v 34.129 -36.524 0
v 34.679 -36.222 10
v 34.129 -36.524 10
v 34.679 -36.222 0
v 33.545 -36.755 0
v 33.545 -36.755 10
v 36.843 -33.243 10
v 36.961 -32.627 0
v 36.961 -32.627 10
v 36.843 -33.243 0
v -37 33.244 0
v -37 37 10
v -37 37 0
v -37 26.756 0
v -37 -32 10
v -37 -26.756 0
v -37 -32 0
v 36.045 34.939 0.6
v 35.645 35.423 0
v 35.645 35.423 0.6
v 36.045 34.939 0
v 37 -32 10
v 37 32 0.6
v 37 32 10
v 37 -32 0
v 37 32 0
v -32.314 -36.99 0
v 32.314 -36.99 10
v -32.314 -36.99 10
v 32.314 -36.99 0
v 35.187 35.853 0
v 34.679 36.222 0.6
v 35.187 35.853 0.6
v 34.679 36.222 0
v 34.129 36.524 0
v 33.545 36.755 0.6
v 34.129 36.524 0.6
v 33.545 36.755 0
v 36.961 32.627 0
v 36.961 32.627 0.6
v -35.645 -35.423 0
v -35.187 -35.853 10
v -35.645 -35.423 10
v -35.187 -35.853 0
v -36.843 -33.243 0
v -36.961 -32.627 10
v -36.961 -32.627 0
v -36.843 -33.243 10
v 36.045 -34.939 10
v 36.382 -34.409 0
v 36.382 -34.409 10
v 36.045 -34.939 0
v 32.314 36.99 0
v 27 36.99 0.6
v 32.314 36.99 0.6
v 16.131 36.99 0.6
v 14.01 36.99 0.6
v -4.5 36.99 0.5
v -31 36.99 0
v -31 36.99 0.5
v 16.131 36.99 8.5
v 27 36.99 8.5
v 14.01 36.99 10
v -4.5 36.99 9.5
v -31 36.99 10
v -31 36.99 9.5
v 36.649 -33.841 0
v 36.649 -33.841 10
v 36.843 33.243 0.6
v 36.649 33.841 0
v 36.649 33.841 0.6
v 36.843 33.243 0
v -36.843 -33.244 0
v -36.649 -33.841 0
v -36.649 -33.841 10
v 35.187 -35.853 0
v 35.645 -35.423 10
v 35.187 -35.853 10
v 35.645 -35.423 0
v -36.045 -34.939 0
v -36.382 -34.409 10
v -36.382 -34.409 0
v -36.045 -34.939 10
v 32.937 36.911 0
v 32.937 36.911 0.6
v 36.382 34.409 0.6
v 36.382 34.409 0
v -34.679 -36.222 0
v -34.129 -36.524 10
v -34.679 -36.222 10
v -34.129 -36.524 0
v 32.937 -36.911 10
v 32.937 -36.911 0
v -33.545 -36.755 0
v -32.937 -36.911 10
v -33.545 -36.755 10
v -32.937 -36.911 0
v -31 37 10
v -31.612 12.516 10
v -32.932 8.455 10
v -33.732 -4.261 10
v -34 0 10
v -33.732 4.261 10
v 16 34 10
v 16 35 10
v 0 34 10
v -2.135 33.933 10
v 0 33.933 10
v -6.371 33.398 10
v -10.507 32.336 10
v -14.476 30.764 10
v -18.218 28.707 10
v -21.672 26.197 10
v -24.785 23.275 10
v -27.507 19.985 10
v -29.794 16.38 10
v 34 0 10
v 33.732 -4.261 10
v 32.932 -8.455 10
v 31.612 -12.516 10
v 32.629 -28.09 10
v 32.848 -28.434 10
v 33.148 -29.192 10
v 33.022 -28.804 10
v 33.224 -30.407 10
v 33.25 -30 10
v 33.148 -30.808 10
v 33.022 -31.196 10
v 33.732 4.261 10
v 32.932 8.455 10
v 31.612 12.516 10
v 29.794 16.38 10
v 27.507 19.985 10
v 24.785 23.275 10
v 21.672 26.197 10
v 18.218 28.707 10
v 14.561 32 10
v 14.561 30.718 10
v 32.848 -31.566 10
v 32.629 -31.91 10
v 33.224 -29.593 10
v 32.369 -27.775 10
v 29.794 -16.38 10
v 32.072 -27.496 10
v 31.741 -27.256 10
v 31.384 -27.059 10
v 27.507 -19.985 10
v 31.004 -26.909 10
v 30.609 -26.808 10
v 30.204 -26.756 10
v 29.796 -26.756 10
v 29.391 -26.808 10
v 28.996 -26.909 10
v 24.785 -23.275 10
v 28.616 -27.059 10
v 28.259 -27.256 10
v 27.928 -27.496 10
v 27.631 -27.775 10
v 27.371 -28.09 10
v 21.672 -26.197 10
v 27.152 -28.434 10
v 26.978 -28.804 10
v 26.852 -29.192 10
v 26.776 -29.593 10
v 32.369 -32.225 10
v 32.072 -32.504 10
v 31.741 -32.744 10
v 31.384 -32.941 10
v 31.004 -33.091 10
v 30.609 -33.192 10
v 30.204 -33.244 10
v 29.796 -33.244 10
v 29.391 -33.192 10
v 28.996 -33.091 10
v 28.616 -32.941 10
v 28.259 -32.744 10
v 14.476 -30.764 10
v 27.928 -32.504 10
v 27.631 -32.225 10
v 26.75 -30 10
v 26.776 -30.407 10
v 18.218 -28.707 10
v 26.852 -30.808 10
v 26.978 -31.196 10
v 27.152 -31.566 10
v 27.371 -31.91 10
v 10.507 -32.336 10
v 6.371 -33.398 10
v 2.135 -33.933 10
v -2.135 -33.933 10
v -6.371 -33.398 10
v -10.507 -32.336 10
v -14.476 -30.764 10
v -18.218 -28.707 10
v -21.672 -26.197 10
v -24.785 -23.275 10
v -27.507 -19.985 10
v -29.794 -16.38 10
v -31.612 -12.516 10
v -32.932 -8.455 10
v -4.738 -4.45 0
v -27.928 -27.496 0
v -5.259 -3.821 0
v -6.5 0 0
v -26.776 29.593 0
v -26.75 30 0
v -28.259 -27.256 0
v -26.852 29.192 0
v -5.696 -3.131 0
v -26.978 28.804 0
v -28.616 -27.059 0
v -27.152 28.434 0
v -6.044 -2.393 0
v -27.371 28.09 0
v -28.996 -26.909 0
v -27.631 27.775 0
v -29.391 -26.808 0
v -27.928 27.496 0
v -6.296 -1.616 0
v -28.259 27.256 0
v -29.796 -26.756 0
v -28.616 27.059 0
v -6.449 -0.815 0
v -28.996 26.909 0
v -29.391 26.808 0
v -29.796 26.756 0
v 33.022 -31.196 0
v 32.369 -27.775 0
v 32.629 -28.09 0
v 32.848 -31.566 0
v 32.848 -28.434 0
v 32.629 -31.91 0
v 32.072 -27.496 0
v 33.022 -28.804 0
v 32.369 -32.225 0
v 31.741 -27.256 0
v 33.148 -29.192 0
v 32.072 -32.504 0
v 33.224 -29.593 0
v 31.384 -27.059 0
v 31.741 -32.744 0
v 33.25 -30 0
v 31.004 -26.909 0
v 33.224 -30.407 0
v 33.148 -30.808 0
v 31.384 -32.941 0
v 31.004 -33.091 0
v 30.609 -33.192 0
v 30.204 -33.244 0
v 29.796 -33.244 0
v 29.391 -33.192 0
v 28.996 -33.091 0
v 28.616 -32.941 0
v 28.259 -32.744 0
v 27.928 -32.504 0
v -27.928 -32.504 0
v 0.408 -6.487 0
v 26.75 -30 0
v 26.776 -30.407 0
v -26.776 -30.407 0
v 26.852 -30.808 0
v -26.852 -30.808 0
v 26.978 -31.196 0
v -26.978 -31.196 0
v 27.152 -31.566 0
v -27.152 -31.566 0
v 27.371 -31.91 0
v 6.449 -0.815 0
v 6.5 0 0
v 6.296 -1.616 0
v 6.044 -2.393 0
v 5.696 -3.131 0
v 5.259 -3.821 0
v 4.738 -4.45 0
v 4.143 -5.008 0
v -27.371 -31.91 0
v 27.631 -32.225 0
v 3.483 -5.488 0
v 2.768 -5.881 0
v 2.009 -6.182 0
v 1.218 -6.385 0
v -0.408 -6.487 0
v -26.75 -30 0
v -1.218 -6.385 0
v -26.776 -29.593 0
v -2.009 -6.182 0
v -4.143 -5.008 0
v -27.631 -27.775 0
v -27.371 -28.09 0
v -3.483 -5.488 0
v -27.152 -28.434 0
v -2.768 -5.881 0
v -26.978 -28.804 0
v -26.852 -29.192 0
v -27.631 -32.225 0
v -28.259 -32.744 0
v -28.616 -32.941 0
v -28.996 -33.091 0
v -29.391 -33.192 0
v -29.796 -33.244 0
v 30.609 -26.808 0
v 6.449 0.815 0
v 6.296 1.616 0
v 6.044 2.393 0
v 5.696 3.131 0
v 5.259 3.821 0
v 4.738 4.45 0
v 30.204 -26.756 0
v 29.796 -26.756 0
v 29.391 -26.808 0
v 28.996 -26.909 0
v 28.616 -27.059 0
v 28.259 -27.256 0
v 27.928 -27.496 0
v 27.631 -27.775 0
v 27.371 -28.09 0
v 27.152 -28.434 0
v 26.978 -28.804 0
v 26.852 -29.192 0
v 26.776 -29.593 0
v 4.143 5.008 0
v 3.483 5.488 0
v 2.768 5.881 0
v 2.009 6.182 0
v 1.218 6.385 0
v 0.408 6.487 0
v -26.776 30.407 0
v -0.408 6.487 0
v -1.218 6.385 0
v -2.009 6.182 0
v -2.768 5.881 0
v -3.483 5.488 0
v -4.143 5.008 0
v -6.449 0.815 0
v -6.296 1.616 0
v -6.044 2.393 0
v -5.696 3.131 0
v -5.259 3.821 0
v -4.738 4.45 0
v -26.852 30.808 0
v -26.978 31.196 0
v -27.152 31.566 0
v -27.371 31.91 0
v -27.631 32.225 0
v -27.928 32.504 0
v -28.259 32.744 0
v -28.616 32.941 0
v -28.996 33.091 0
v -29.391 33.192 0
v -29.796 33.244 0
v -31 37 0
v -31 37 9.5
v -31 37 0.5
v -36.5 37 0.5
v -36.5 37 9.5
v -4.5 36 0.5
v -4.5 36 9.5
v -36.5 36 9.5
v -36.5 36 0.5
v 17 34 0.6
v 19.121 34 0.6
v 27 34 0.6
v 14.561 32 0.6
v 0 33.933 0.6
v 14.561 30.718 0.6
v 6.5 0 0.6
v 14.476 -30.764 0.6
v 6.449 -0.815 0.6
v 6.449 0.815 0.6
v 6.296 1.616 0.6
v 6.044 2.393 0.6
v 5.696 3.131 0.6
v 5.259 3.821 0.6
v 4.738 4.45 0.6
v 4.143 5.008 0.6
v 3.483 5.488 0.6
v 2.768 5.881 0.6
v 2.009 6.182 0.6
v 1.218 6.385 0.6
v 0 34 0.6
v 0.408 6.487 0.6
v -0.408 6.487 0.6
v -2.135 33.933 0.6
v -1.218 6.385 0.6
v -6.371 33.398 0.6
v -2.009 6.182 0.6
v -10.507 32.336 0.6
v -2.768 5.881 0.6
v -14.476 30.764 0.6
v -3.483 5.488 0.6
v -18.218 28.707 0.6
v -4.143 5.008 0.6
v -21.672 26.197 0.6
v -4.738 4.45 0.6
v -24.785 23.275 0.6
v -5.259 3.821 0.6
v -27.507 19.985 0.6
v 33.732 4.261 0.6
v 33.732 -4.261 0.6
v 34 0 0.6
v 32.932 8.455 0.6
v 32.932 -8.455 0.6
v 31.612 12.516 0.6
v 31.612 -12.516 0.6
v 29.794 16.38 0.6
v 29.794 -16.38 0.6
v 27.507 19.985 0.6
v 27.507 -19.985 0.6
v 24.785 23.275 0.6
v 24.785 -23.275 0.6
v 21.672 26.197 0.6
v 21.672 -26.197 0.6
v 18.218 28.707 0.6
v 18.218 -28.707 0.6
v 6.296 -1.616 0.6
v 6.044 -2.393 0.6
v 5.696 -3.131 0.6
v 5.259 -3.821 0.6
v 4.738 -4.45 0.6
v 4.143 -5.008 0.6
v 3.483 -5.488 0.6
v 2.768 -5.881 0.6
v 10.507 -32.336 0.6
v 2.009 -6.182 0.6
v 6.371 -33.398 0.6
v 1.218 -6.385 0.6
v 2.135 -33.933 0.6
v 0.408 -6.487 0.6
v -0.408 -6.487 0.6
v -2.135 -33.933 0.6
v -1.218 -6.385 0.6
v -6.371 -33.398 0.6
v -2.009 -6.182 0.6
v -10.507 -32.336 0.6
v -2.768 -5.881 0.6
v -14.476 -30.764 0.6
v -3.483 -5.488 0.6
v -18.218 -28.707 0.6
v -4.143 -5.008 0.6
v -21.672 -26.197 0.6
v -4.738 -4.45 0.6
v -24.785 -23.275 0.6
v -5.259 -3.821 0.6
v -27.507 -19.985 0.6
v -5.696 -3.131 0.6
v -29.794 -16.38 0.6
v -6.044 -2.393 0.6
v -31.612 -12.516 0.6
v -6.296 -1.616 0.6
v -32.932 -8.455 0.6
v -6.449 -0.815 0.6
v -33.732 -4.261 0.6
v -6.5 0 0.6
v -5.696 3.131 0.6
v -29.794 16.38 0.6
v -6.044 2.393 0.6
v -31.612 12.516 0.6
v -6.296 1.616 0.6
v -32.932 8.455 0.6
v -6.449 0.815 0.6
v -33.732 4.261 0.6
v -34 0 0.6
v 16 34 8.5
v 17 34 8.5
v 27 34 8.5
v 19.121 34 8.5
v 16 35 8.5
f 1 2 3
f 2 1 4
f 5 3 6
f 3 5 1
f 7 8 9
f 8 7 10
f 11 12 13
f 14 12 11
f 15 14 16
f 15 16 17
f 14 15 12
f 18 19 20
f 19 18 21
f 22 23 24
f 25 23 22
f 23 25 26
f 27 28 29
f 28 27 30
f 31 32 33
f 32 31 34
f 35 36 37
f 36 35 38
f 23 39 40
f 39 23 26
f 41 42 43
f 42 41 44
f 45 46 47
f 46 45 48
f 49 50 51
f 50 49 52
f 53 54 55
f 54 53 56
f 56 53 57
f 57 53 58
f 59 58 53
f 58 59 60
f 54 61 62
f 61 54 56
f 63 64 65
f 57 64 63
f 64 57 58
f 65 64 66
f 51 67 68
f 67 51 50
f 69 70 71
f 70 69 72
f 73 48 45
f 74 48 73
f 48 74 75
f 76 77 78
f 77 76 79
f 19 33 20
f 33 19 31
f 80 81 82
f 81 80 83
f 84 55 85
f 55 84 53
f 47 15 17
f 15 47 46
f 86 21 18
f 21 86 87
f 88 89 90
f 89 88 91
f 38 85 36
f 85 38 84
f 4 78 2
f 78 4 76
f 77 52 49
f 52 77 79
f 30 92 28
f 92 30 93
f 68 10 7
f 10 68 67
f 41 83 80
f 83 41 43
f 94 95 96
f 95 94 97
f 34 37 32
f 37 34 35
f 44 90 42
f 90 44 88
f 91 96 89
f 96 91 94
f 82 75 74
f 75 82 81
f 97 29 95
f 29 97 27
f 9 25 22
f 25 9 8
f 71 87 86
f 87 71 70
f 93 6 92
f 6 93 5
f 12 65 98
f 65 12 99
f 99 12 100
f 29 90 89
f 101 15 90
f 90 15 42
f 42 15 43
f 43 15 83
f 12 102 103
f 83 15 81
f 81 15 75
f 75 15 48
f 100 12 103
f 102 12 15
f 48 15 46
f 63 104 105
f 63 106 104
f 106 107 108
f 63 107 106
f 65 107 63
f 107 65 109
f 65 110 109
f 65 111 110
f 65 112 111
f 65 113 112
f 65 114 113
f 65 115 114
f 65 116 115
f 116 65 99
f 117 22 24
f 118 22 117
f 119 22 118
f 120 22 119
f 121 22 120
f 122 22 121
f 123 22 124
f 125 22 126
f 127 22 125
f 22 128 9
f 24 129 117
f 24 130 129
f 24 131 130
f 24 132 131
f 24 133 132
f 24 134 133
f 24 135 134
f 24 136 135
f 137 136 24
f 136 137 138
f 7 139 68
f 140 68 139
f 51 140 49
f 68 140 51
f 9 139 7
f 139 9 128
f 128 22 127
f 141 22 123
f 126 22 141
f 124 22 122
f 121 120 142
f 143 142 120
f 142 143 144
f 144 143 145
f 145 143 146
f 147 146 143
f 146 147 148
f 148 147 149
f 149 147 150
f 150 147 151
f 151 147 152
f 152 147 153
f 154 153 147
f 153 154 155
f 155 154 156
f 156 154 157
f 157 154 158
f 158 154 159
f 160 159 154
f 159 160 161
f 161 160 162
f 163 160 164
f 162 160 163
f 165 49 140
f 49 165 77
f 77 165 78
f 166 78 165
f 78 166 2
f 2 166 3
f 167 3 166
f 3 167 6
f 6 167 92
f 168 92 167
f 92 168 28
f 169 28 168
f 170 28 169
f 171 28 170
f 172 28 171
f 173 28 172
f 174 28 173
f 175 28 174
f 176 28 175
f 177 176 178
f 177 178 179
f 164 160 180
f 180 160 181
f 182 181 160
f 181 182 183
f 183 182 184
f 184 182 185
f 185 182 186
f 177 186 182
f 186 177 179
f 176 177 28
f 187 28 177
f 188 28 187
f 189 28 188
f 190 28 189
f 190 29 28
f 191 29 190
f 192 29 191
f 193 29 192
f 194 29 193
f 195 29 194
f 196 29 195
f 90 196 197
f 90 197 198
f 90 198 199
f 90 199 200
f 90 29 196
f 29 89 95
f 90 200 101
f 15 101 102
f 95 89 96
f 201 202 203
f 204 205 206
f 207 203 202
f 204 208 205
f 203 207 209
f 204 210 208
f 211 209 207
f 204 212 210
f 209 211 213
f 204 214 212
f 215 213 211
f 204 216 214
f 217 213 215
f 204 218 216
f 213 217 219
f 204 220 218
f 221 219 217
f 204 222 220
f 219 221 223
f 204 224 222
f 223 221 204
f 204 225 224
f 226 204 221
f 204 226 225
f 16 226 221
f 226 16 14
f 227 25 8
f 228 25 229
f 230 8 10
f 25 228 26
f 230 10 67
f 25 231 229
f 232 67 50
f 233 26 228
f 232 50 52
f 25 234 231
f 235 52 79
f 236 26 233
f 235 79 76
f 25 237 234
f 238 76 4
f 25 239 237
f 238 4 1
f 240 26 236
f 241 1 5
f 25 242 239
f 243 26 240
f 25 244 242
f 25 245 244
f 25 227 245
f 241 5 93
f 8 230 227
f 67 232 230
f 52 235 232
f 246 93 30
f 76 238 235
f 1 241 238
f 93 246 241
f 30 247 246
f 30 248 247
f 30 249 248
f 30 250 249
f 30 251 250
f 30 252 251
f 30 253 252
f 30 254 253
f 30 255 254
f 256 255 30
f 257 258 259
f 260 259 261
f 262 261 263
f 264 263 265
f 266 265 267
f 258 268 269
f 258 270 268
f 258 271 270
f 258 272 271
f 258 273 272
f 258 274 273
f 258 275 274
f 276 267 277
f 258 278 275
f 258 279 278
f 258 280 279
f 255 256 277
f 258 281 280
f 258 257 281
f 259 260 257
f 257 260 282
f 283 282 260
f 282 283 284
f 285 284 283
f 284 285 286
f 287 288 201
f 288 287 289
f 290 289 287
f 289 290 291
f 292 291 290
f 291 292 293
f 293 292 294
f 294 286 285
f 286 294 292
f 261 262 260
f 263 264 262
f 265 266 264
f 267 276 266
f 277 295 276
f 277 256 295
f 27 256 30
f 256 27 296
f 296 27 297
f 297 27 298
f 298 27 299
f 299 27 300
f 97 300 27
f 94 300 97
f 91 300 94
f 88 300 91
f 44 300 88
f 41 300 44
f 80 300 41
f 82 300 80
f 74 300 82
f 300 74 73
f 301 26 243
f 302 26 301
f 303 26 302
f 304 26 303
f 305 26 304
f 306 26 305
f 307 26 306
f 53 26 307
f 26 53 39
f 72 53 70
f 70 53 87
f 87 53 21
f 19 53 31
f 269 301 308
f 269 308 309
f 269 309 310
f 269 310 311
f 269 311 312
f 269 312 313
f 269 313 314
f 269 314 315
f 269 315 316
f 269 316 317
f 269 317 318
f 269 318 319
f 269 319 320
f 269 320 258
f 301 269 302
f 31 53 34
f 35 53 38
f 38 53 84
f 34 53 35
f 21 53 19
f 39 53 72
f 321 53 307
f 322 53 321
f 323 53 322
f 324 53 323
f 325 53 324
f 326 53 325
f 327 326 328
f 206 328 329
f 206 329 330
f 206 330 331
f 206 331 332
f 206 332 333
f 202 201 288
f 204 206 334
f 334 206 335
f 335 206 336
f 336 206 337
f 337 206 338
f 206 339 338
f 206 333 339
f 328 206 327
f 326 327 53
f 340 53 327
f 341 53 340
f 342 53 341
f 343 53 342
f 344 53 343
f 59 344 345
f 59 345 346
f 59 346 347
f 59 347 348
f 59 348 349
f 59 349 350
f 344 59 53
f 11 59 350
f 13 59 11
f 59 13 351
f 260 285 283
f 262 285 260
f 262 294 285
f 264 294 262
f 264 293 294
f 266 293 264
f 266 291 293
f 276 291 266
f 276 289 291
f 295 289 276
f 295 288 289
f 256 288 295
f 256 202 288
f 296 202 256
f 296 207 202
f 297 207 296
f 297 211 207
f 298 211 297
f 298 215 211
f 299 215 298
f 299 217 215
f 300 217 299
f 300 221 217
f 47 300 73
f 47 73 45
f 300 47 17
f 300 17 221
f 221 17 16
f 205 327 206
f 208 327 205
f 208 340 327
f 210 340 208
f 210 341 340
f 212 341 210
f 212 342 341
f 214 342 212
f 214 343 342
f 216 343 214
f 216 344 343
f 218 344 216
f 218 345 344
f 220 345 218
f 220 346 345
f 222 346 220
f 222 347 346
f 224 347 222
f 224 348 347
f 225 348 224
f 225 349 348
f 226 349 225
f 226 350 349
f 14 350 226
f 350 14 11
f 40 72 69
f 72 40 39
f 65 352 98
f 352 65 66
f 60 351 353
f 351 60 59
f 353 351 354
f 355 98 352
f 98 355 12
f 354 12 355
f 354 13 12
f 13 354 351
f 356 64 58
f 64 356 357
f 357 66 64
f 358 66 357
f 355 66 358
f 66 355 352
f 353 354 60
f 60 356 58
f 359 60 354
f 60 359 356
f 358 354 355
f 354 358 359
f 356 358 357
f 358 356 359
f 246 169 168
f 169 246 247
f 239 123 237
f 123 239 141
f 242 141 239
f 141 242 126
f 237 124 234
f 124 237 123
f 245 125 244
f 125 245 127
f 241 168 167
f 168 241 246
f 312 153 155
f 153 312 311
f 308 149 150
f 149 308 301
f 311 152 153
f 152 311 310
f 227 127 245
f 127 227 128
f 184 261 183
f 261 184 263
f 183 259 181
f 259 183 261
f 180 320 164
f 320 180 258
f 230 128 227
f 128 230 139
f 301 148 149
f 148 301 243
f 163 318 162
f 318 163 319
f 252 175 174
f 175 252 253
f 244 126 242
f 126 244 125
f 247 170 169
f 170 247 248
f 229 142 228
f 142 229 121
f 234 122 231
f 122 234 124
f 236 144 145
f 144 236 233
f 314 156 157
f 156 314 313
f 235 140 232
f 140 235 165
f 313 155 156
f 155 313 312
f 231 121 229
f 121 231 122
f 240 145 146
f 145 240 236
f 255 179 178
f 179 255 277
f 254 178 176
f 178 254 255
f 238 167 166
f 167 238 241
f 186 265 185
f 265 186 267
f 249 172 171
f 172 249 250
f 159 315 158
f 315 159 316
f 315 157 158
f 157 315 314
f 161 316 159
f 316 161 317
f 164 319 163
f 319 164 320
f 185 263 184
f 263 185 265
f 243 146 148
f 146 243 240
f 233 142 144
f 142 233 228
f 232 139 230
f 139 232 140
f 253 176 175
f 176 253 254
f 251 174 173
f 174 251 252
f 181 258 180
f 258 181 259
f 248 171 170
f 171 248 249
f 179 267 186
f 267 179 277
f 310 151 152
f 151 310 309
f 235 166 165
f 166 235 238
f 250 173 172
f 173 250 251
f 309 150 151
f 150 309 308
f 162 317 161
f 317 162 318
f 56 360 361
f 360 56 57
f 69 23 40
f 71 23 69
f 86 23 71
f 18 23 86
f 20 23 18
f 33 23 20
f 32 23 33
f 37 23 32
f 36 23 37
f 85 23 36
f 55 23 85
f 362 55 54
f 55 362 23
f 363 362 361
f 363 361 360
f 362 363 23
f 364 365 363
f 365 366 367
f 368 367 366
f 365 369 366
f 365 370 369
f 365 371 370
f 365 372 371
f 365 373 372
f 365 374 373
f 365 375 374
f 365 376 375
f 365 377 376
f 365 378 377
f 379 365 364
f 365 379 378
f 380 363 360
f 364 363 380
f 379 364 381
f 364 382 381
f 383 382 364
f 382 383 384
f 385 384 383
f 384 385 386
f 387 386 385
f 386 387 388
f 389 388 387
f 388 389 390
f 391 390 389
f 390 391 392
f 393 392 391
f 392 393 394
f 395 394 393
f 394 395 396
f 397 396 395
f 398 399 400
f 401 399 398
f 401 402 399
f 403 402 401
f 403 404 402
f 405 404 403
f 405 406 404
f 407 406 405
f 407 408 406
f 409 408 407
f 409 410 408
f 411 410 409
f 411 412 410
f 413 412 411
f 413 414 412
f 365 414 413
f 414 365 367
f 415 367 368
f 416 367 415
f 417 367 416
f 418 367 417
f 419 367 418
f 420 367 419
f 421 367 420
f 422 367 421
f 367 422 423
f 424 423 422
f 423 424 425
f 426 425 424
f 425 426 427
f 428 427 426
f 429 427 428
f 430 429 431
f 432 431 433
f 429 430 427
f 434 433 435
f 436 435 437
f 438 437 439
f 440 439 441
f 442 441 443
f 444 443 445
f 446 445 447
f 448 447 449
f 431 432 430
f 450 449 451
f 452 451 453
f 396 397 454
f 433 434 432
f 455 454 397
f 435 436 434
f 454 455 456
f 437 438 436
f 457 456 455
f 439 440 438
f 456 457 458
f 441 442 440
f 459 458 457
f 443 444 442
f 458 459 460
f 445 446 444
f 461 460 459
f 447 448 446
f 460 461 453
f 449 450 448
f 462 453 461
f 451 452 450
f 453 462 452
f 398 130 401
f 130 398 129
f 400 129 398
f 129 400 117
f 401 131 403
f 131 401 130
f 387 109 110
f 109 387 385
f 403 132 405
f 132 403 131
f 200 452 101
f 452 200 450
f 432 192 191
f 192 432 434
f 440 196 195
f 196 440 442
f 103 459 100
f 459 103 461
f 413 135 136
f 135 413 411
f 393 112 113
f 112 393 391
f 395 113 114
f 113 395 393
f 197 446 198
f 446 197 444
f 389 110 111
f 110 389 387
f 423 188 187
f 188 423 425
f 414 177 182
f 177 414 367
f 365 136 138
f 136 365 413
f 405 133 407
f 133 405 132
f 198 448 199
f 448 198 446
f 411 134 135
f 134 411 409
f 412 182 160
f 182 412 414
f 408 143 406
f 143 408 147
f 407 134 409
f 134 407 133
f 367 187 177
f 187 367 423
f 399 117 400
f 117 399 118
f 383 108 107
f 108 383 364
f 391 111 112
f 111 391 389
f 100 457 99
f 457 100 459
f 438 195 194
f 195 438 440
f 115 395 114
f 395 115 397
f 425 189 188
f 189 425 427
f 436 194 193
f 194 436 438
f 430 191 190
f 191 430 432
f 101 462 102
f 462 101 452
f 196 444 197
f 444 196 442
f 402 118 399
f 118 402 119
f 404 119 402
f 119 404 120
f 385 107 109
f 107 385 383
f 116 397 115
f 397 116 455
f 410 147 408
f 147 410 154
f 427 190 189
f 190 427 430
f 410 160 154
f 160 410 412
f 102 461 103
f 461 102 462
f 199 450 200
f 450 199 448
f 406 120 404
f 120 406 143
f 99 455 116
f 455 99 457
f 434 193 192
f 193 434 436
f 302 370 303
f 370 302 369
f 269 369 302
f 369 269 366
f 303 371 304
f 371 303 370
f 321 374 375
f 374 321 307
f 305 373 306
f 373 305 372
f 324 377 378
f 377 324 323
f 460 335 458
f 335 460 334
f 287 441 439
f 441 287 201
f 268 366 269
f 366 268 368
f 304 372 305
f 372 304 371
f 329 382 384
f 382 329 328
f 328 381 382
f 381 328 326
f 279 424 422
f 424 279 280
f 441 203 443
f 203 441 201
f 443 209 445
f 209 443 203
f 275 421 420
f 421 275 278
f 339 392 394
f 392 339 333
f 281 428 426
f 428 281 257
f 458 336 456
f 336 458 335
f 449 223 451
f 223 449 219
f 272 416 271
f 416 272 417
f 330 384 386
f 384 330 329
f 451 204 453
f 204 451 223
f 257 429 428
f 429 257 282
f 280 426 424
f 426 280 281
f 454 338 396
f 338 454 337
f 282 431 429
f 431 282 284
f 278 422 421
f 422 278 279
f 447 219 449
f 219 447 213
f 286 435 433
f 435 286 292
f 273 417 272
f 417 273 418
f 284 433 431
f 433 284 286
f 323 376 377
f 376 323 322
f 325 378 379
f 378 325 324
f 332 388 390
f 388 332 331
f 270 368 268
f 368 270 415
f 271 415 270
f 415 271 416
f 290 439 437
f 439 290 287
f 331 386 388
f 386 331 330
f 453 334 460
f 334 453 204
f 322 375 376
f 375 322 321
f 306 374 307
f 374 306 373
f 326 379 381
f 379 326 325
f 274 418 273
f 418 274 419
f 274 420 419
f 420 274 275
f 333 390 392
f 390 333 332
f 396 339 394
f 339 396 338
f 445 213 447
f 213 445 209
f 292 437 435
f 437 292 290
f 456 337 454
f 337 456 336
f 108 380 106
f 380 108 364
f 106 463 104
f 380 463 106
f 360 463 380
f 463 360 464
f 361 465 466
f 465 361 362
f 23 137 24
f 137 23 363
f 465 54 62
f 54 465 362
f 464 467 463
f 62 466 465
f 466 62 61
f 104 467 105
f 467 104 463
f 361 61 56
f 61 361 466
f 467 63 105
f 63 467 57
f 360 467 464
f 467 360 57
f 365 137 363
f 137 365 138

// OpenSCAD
$fn = 50;


difference() {
	union() {
		hull() {
			translate(v = [-32.0000000000, 32.0000000000, 0]) {
				cylinder(h = 10, r = 5);
			}
			translate(v = [32.0000000000, 32.0000000000, 0]) {
				cylinder(h = 10, r = 5);
			}
			translate(v = [-32.0000000000, -32.0000000000, 0]) {
				cylinder(h = 10, r = 5);
			}
			translate(v = [32.0000000000, -32.0000000000, 0]) {
				cylinder(h = 10, r = 5);
			}
		}
		translate(v = [-37.0000000000, 31.0000000000, 0]) {
			cube(size = [6, 6, 10]);
		}
	}
	union() {
		translate(v = [-37.5000000000, -30.0000000000, -250.0000000000]) {
			rotate(a = [0, 0, 0]) {
				difference() {
					union() {
						hull() {
							translate(v = [7.5000000000, 0, 0]) {
								cylinder(h = 250, r = 3.2500000000, r1 = 3.2500000000, r2 = 3.2500000000);
							}
							translate(v = [-7.5000000000, 0, 0]) {
								cylinder(h = 250, r = 3.2500000000, r1 = 3.2500000000, r2 = 3.2500000000);
							}
						}
					}
					union();
				}
			}
		}
		translate(v = [-37.5000000000, 30.0000000000, -250.0000000000]) {
			rotate(a = [0, 0, 0]) {
				difference() {
					union() {
						hull() {
							translate(v = [7.5000000000, 0, 0]) {
								cylinder(h = 250, r = 3.2500000000, r1 = 3.2500000000, r2 = 3.2500000000);
							}
							translate(v = [-7.5000000000, 0, 0]) {
								cylinder(h = 250, r = 3.2500000000, r1 = 3.2500000000, r2 = 3.2500000000);
							}
						}
					}
					union();
				}
			}
		}
		translate(v = [-36.5000000000, 36.0000000000, 0.5000000000]) {
			cube(size = [32, 1, 9.0000000000]);
		}
		translate(v = [30.0000000000, -30.0000000000, -50.0000000000]) {
			cylinder(h = 100, r = 3.2500000000);
		}
		translate(v = [0, 0, 0.6000000000]) {
			cylinder(h = 12.4000000000, r = 34.0000000000);
		}
		translate(v = [0, 0, -5.0000000000]) {
			cylinder(h = 10, r = 6.5000000000);
		}
		translate(v = [0.0000000000, 32.0000000000, 0.6000000000]) {
			cube(size = [37.0000000000, 2, 12.4000000000]);
		}
		translate(v = [27.0000000000, 32.0000000000, 0.6000000000]) {
			cube(size = [10, 5, 12.4000000000]);
		}
		translate(v = [16.0000000000, 32.0000000000, 8.5000000000]) {
			cube(size = [21, 5, 1.5000000000]);
		}
		translate(v = [13.2500000000, 37.7500000000, 0.6000000000]) {
			rotate(a = [0, 0, -45]) {
				cube(size = [7.5000000000, 1.5000000000, 12.4000000000]);
			}
		}
		translate(v = [7.0610000000, 30.0000000000, 0.6000000000]) {
			cube(size = [7.5000000000, 2, 9.4000000000]);
		}
	}
}
